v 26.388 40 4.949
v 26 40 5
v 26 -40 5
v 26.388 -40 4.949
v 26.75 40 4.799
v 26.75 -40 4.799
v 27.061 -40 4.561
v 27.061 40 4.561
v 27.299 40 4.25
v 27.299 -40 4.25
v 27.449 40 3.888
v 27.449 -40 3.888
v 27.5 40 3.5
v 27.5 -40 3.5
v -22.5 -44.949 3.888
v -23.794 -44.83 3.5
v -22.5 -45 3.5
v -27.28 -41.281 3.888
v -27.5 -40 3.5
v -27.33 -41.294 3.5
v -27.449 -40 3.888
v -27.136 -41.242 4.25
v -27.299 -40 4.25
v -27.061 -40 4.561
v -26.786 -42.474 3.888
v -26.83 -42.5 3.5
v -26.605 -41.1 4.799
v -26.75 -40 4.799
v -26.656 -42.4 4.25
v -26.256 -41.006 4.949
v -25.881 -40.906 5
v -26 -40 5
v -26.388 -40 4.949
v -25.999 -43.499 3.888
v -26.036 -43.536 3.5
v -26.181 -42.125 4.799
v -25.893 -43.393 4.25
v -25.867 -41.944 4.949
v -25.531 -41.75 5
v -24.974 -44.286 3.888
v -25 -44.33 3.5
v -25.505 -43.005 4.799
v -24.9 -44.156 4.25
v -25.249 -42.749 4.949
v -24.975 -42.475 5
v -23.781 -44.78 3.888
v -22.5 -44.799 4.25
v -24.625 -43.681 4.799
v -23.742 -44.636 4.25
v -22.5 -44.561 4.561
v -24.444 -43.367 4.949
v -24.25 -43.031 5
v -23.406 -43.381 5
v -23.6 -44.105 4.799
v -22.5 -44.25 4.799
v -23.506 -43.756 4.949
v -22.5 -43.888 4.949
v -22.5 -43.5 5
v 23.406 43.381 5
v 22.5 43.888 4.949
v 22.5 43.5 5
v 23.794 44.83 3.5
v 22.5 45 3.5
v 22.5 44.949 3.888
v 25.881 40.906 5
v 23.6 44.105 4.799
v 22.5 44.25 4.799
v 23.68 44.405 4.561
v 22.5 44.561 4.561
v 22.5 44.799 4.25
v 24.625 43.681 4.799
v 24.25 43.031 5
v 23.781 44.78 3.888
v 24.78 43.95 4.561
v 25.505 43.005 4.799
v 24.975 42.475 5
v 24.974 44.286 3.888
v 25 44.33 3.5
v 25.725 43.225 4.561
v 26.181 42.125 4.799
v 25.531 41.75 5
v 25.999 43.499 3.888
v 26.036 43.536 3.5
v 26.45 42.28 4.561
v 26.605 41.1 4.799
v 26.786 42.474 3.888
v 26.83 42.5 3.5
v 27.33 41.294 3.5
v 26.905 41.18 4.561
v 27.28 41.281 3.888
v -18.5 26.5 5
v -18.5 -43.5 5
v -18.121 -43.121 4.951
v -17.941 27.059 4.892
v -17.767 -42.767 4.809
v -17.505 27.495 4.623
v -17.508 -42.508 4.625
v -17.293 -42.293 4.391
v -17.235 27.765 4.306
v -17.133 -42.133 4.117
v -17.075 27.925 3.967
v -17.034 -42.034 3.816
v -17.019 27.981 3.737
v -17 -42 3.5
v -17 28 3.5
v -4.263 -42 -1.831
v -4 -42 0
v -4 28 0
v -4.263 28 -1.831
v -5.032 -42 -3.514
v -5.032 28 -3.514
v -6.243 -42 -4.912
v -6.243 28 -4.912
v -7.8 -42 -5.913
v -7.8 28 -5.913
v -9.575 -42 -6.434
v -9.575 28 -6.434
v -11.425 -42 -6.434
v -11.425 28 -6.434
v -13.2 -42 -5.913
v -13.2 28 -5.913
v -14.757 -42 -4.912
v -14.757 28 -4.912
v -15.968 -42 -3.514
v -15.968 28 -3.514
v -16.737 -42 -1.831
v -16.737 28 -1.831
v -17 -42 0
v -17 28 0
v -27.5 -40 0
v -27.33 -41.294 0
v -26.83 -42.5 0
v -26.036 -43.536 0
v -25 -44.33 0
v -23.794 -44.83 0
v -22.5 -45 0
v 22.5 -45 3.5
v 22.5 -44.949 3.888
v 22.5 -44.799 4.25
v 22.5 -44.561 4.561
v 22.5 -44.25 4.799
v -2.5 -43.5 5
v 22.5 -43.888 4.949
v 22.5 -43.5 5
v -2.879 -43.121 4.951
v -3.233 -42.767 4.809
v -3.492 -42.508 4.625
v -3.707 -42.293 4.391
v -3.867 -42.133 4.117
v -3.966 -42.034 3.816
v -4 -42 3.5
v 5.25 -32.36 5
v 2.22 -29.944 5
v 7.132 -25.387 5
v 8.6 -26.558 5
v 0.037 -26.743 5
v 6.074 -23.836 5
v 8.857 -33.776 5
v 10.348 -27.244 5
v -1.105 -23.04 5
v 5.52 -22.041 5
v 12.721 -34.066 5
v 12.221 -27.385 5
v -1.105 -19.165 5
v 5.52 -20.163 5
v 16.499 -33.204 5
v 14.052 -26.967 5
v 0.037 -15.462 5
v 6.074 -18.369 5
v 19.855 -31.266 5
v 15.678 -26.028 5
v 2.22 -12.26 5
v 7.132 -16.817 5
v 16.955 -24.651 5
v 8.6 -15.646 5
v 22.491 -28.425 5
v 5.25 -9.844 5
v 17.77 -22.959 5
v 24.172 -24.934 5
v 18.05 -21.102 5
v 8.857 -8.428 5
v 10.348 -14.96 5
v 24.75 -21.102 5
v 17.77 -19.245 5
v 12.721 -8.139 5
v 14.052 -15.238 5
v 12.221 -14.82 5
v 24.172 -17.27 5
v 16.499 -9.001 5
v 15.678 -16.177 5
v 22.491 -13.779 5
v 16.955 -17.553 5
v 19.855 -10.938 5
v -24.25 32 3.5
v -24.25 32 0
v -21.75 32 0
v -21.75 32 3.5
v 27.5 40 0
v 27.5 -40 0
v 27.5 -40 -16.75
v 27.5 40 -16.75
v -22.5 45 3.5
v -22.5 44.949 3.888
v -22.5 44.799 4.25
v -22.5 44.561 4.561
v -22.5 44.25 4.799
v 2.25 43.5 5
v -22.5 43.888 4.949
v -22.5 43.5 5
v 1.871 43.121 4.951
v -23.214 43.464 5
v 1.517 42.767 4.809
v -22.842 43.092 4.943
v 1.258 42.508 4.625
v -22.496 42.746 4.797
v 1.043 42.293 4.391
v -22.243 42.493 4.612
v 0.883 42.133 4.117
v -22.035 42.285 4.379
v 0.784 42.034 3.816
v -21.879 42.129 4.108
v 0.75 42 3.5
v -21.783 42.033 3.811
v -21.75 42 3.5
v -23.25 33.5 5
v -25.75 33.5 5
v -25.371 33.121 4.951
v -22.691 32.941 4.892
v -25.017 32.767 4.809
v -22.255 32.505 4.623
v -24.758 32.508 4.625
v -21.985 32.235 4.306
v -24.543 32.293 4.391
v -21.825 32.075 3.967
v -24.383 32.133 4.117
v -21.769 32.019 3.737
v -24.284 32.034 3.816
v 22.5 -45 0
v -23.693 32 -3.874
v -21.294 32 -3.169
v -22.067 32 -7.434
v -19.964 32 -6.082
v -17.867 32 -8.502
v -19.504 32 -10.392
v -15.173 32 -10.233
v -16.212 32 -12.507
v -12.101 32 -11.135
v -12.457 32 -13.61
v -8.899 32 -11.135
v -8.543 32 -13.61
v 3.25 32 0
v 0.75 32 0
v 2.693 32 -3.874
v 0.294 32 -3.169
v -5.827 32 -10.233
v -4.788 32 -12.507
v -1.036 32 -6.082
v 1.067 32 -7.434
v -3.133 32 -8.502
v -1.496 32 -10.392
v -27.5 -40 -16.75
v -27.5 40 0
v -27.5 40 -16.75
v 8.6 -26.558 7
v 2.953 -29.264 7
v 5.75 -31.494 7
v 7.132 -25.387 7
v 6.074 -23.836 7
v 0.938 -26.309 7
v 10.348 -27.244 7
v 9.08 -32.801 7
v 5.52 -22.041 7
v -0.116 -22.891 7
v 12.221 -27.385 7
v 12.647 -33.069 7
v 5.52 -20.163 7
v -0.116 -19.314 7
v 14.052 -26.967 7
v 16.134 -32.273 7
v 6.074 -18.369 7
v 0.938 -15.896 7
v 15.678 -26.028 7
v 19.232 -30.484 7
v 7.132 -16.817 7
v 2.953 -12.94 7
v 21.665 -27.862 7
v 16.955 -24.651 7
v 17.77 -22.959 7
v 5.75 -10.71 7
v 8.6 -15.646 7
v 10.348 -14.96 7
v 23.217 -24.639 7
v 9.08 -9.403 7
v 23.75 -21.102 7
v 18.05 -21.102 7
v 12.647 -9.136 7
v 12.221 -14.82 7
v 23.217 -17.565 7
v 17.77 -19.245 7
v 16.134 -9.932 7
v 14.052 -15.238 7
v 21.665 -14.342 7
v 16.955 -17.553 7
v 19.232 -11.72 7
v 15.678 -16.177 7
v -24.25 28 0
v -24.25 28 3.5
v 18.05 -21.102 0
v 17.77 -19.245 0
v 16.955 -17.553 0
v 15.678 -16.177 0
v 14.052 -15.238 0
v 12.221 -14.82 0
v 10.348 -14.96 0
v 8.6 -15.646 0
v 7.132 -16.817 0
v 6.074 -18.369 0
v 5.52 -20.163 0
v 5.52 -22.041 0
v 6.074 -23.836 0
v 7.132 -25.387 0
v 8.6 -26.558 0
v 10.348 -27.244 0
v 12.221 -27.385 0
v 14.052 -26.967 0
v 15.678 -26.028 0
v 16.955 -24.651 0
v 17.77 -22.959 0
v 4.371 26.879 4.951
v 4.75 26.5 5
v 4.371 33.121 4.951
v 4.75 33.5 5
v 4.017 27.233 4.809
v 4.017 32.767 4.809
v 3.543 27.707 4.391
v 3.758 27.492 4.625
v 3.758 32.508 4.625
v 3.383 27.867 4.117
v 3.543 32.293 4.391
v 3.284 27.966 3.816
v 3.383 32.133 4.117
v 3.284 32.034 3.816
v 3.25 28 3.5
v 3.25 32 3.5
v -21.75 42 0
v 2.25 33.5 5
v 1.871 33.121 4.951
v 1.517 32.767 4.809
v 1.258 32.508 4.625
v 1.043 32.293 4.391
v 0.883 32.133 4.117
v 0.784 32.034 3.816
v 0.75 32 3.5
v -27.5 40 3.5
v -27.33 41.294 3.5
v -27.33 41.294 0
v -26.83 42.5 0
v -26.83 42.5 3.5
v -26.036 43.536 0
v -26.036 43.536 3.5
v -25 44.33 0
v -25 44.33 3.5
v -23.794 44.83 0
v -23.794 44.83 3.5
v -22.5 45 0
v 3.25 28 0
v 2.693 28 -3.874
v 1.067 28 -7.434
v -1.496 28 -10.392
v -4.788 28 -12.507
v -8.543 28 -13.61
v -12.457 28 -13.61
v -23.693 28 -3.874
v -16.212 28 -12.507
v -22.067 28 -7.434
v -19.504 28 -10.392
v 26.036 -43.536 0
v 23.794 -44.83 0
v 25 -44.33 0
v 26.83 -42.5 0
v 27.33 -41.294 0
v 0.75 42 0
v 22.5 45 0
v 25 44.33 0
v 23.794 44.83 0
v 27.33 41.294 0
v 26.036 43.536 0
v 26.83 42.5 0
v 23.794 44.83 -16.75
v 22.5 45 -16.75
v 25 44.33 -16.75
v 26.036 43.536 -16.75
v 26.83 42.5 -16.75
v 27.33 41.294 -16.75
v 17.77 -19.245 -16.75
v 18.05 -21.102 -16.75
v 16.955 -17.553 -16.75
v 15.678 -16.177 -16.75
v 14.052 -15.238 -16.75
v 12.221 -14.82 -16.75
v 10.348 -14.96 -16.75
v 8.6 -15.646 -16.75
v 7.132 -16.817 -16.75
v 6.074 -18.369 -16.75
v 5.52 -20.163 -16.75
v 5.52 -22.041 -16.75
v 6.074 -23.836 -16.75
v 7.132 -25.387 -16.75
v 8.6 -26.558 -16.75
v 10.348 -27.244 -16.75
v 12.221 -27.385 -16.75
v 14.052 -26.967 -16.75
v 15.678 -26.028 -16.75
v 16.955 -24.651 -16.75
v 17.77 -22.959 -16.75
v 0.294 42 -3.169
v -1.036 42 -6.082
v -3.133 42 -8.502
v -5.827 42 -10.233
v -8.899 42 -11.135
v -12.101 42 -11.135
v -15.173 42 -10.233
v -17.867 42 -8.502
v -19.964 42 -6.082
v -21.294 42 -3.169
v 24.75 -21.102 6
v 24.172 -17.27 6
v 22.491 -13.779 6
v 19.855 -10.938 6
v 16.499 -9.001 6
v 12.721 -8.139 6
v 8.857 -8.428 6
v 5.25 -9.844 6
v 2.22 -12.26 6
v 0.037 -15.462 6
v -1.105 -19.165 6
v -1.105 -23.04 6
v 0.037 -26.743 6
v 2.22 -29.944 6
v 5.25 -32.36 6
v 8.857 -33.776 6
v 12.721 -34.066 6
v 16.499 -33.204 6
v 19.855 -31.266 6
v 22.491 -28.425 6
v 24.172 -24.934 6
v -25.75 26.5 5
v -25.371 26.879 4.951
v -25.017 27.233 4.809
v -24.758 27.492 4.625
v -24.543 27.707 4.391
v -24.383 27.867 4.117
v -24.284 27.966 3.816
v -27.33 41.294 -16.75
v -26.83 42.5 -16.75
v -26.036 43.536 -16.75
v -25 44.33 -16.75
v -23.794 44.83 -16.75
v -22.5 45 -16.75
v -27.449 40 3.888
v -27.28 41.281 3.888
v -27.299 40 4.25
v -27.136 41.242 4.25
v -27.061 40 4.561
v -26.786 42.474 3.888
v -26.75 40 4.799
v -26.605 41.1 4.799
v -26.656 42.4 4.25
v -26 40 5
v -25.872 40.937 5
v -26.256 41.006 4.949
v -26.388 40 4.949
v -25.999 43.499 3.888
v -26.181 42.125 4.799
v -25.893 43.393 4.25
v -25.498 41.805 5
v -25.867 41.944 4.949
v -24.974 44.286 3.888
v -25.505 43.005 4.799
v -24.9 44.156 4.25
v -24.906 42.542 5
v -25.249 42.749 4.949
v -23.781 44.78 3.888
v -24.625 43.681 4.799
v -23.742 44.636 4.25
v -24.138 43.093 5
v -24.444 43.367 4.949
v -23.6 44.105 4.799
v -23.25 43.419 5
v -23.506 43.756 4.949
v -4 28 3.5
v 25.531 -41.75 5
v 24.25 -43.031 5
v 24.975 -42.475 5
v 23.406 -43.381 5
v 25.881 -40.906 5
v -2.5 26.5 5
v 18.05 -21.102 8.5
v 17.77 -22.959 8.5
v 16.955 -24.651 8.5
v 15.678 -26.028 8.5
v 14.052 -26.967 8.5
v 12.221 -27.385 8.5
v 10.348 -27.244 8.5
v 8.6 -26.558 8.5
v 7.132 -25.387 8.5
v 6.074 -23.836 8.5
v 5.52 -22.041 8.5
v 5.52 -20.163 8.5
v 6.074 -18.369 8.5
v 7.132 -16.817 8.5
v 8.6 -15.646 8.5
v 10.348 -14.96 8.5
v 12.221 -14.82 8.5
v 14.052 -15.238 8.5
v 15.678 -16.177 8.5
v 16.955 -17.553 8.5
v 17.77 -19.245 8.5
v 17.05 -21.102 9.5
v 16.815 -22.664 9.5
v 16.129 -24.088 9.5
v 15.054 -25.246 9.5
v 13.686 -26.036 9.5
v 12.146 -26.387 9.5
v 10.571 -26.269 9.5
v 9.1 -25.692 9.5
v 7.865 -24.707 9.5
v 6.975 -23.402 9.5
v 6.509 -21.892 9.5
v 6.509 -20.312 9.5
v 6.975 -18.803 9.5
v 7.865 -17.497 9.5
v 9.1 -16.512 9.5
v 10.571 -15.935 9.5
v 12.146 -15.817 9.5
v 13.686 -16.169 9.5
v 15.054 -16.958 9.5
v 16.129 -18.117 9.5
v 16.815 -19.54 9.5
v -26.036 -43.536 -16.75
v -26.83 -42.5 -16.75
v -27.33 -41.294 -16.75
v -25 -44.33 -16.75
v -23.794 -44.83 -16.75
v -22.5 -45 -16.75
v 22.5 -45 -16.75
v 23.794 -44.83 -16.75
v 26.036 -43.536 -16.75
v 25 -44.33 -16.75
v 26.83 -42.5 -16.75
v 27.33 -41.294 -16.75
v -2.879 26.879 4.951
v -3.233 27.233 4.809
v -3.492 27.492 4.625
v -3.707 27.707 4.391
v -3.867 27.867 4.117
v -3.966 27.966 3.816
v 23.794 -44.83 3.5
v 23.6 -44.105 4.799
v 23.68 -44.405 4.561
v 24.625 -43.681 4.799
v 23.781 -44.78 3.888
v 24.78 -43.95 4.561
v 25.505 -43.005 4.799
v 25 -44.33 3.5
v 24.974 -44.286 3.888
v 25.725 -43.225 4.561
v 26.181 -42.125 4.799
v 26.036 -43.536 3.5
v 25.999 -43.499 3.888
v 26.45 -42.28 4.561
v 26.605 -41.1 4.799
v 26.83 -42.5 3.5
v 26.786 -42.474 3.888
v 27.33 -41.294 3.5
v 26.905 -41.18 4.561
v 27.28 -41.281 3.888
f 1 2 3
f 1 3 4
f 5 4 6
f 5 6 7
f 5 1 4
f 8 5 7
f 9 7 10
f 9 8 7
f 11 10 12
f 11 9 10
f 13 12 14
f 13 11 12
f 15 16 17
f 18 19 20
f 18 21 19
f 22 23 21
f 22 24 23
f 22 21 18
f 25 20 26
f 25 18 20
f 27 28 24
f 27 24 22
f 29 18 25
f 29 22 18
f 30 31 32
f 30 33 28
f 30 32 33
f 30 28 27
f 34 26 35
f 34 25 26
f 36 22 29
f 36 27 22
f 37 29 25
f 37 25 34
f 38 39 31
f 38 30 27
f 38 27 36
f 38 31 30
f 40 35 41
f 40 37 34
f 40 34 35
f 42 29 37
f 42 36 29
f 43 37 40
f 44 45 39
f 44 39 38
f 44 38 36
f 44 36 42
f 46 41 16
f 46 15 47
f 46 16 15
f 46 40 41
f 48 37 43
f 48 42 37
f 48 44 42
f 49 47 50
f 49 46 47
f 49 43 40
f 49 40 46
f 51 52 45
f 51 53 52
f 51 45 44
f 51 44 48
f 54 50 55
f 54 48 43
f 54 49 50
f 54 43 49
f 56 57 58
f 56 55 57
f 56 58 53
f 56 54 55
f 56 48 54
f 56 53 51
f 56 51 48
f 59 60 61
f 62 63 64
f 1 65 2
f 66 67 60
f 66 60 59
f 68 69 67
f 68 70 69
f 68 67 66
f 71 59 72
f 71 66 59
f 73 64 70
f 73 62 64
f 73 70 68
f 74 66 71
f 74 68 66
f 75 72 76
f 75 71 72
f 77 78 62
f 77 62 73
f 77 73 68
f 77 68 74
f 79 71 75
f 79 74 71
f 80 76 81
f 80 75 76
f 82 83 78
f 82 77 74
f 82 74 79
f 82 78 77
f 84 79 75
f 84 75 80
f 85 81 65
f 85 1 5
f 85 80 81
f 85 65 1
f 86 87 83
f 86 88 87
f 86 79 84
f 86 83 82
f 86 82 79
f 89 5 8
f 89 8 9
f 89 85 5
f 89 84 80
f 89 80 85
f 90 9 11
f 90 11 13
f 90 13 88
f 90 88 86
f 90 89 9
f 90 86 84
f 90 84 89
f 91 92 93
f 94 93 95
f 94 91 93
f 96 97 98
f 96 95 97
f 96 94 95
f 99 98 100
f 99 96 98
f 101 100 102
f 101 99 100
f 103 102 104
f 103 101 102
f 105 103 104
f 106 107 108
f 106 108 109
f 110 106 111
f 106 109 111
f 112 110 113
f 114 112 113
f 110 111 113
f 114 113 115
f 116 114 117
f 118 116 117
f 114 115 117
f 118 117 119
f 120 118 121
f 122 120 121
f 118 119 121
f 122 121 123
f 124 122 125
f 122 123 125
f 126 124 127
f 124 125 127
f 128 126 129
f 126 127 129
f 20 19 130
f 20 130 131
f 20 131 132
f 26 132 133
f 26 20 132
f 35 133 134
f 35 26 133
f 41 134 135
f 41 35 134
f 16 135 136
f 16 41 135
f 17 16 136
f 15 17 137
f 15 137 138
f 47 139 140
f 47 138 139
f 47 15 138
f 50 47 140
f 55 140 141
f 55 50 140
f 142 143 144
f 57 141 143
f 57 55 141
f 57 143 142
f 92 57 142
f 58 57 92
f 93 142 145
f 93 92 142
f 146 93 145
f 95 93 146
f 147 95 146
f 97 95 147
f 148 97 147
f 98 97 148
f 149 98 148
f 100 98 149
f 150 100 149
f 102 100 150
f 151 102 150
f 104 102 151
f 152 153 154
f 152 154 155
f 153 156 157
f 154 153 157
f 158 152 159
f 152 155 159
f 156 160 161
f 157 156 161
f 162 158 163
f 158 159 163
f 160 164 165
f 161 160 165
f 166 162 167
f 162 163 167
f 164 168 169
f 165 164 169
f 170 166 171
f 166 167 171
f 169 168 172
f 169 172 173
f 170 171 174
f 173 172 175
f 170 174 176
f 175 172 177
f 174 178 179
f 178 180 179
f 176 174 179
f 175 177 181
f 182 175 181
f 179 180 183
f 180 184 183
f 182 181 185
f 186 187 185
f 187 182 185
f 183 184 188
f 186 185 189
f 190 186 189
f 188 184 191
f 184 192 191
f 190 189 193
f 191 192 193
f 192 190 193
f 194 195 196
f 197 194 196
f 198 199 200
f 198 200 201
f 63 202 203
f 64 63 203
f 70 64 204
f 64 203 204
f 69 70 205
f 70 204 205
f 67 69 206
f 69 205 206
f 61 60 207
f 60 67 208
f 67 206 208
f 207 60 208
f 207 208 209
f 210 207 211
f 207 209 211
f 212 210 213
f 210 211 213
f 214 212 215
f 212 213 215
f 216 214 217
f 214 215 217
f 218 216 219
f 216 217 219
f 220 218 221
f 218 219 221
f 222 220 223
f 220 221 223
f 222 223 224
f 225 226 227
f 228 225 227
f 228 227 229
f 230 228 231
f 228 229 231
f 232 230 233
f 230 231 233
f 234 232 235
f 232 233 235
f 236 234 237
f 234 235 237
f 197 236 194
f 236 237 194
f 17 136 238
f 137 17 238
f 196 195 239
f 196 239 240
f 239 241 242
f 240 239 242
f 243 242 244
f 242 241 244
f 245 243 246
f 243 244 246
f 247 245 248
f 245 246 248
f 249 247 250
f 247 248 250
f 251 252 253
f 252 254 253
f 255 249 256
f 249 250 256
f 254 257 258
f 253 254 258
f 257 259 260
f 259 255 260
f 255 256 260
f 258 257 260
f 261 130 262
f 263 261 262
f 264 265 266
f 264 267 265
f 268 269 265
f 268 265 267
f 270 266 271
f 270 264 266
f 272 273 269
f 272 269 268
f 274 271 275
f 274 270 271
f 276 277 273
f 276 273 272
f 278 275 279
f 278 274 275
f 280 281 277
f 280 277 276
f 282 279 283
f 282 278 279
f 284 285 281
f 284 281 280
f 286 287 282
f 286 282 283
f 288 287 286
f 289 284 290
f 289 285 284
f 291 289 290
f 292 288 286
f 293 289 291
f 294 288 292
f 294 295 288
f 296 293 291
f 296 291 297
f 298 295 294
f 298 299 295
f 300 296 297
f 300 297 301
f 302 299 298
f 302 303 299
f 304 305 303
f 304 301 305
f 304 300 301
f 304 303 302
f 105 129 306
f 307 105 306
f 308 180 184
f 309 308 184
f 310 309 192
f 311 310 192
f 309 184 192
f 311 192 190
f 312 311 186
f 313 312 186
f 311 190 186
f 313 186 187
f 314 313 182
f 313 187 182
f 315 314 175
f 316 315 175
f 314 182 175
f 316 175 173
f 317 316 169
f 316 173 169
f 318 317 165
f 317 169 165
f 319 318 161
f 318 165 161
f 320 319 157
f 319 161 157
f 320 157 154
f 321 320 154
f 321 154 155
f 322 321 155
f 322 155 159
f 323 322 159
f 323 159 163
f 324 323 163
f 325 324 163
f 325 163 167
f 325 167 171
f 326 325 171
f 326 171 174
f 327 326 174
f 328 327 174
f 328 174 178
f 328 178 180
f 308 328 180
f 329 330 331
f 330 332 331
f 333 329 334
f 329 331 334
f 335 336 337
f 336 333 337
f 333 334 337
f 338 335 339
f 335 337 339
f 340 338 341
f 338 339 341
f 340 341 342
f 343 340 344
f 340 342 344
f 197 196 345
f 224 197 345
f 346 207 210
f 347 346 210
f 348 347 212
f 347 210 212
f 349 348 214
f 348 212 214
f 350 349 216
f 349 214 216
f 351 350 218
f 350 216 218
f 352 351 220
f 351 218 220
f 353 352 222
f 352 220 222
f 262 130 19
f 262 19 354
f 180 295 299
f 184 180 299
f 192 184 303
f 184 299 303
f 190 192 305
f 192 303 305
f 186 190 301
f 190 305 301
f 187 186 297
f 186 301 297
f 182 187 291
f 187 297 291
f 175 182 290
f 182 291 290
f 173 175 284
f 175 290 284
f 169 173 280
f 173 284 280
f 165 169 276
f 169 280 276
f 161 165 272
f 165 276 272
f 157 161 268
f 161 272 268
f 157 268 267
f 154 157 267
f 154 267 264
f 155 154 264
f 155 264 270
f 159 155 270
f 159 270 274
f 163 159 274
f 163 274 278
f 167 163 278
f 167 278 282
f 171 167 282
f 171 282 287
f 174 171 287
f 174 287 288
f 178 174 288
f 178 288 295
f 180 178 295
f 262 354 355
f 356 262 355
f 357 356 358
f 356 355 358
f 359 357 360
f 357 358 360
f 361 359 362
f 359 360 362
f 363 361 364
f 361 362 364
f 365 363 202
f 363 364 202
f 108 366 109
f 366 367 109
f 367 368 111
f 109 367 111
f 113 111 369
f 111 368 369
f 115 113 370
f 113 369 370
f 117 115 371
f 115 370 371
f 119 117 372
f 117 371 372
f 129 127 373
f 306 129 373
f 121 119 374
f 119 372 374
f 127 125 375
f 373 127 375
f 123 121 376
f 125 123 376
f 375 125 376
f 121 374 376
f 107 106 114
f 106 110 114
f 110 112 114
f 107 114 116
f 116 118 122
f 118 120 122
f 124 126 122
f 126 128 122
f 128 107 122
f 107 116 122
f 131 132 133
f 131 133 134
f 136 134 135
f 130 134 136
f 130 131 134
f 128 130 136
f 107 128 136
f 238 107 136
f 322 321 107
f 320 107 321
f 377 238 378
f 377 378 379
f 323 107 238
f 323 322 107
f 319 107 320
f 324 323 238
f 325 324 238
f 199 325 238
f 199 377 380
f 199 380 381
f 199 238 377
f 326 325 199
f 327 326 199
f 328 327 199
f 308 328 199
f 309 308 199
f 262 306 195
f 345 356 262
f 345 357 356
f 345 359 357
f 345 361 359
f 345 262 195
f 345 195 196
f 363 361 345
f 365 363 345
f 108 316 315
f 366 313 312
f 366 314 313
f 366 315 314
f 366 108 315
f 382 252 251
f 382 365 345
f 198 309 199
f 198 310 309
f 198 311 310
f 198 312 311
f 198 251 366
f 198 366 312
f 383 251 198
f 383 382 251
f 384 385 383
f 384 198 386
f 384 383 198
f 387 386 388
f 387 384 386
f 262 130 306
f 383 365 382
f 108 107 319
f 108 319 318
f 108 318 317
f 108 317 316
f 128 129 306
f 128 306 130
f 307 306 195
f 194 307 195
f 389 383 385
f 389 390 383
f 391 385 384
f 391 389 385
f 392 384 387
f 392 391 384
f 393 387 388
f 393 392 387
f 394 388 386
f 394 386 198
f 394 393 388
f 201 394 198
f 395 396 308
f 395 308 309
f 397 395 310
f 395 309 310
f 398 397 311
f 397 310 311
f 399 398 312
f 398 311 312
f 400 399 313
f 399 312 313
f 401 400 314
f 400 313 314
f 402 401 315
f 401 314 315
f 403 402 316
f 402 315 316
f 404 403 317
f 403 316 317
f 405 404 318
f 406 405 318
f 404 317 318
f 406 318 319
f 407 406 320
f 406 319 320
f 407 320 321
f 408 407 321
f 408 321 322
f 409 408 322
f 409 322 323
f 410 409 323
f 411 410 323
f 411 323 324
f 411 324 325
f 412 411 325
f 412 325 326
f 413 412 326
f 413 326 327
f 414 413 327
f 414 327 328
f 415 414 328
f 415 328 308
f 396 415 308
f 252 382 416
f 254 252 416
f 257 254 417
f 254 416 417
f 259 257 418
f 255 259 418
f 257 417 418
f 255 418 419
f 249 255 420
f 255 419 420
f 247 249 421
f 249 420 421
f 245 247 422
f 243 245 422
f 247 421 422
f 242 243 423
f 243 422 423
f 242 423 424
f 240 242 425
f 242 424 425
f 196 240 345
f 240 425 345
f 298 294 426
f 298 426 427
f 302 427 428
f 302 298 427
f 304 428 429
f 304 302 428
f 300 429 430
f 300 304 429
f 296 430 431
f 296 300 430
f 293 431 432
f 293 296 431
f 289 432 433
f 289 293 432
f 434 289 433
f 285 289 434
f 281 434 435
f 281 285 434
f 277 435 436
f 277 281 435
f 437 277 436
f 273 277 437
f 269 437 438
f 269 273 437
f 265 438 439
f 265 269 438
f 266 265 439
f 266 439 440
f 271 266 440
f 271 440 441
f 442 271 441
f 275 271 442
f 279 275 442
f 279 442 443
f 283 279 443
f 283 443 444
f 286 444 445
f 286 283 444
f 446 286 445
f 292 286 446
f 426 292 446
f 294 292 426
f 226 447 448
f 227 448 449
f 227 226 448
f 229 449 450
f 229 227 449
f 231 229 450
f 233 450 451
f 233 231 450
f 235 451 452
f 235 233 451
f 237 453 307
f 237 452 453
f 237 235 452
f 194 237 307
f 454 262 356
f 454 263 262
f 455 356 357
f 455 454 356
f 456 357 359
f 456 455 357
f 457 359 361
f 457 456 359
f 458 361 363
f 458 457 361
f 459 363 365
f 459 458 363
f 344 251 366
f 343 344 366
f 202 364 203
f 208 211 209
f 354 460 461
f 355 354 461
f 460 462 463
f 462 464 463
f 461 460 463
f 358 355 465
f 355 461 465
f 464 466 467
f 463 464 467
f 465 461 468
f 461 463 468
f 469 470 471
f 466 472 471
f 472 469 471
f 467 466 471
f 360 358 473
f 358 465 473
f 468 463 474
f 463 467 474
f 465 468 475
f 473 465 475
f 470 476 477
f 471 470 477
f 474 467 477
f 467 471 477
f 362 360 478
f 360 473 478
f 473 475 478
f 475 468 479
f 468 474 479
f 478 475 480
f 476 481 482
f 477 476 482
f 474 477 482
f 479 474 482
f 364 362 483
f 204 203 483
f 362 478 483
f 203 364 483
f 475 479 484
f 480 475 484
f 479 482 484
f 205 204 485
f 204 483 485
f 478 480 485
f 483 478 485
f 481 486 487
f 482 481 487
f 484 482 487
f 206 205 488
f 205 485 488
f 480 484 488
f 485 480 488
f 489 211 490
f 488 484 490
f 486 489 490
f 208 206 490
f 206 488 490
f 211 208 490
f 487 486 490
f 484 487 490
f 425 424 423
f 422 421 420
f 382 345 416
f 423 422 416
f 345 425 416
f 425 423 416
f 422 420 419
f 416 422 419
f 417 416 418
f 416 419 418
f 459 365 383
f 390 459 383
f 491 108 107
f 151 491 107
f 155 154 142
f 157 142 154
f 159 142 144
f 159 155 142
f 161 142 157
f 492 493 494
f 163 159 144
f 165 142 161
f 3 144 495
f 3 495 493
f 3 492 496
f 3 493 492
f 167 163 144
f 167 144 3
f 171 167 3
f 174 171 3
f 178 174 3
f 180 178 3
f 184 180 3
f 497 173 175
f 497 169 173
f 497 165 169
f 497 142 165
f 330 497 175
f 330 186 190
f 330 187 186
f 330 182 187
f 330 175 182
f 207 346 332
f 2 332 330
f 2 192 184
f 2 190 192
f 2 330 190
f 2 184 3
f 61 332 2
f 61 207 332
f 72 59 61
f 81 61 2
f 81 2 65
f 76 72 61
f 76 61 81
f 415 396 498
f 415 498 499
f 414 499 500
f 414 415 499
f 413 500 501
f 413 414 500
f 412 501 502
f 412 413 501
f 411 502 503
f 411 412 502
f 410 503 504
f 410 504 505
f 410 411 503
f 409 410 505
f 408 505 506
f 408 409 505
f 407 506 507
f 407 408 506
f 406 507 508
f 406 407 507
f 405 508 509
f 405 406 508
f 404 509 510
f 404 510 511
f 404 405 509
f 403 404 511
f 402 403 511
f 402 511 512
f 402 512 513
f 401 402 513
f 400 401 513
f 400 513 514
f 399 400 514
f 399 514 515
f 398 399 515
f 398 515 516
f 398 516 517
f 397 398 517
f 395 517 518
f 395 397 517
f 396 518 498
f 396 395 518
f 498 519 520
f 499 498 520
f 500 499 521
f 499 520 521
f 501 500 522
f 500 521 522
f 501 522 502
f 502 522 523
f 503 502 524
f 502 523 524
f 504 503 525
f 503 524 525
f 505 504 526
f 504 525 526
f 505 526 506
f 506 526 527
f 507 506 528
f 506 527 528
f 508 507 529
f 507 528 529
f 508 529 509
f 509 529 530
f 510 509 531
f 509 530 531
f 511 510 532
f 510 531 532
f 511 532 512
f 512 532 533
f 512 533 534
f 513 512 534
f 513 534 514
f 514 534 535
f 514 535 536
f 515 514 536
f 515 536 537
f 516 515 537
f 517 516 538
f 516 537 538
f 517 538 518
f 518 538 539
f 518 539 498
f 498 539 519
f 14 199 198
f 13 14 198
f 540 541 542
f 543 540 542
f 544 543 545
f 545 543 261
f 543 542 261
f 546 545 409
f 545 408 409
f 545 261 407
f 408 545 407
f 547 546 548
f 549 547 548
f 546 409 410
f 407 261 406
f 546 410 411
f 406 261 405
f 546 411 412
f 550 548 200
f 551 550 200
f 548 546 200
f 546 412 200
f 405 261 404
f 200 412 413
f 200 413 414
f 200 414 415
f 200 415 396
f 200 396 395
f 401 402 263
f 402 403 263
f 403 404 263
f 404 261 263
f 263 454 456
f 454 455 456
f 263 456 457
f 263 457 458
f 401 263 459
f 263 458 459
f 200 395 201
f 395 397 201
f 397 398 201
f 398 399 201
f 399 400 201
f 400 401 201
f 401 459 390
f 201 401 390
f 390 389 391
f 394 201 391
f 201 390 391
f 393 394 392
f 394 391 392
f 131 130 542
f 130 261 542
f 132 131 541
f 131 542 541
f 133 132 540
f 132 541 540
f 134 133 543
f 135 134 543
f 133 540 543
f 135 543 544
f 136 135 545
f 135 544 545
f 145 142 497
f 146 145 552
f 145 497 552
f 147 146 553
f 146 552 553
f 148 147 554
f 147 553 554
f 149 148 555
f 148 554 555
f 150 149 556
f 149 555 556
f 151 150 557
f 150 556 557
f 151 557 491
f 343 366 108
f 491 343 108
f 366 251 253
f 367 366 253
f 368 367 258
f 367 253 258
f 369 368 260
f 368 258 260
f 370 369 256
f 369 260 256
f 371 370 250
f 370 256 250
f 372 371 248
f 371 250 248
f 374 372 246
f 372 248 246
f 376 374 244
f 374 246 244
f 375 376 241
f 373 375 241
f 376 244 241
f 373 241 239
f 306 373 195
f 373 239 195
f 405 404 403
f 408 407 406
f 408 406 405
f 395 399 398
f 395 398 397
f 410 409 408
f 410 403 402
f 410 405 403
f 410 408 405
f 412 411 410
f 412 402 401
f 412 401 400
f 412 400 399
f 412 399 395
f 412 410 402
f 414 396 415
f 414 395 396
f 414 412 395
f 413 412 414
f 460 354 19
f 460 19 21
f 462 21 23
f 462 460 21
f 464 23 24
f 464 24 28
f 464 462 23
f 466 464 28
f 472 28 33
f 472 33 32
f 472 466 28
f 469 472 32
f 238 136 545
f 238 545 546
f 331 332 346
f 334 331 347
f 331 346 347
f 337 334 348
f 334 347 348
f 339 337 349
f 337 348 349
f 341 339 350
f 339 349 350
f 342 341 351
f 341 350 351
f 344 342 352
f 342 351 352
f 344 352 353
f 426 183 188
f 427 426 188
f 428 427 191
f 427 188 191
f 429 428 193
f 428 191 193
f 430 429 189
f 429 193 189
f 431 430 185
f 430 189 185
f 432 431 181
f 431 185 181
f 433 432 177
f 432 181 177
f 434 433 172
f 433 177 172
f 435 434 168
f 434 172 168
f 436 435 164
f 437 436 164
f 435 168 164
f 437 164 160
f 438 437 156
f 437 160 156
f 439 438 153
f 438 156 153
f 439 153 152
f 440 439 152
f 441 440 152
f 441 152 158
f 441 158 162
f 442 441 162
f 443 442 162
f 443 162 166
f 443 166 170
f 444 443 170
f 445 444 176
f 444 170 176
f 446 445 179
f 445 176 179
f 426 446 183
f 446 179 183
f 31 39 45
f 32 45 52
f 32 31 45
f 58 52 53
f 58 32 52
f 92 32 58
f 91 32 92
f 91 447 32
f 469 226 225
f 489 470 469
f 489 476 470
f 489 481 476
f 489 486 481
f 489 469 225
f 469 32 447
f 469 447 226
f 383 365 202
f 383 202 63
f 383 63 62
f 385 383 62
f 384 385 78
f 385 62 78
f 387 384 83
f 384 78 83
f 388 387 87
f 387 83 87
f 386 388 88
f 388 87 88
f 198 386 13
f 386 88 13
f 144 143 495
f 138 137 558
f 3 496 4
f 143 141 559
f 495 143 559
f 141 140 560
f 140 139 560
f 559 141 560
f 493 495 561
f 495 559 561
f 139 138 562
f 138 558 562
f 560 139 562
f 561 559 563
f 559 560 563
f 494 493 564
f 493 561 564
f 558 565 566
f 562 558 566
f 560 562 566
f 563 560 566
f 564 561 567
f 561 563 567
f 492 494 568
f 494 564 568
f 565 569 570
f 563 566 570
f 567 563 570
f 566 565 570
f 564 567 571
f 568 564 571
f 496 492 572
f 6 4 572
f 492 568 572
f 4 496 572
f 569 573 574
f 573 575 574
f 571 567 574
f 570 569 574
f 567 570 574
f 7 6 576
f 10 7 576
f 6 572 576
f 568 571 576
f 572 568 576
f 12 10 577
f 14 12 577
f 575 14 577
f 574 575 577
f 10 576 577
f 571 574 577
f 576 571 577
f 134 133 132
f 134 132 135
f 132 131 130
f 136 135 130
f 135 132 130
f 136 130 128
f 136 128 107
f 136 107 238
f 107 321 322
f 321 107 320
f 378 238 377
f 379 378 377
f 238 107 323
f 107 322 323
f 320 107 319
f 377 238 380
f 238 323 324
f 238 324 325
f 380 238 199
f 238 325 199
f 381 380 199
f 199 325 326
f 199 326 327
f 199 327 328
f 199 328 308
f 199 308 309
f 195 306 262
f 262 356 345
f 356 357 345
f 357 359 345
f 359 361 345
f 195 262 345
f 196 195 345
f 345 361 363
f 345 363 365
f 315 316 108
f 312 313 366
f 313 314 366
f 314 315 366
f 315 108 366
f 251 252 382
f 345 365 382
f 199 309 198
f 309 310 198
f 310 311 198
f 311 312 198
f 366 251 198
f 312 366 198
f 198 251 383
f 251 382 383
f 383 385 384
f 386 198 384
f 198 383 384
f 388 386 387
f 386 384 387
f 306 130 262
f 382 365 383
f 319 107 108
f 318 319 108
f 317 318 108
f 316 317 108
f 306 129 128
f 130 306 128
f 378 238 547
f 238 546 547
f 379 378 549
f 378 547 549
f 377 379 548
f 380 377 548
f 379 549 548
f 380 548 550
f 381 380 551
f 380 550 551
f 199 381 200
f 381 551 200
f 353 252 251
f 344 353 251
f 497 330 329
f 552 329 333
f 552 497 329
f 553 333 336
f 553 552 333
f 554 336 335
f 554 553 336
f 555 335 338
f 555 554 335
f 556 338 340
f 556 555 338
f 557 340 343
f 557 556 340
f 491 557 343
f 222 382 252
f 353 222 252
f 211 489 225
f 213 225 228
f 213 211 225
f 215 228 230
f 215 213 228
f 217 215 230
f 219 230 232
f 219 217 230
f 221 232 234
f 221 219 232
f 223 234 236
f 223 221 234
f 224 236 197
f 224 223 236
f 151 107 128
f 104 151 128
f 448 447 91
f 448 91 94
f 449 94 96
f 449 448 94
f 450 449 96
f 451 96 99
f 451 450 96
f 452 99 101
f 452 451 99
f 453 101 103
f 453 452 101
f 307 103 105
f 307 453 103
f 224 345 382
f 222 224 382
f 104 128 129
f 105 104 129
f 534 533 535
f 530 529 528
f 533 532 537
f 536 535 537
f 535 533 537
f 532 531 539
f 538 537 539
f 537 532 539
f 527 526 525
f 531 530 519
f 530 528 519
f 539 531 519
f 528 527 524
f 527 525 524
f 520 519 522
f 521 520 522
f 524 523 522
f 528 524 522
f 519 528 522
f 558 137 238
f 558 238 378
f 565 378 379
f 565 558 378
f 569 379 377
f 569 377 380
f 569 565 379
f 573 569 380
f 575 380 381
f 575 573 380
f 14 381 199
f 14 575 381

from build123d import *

# Parameters (mm, degrees)
F0_W           = 55
F0_H           = 90
F1_DEPTH       = 16.75
F4_R           = 13
F5_DEPTH       = 2
F7_W           = 55
F7_H           = 90
F8_DEPTH       = 5
F9_R           = 13
F10_DEPTH      = 2
F11_R          = 6.3
F12_DEPTH      = 23.751
F13_R          = 5
F13_2_R        = 5
F14_SIZE       = 1
F15_T1_DEPTH   = 22.5
F15_T3_DEPTH   = 13.75
F15_T5_DEPTH   = 6.25
F15_T7_DEPTH   = 4
F15_T9_DEPTH   = 11
F15_T11_DEPTH  = 73.75
F15_T13_DEPTH  = 13
F15_T15_DEPTH  = 11
F15_T17_DEPTH  = 6.25
F15_T19_DEPTH  = 80
F15_T21_DEPTH  = 45
F15_T24_ANGLE  = 90
F15_T26_ANGLE  = 90
F15_T28_ANGLE  = 90
F15_T30_ANGLE  = 90
F15_T35_DEPTH  = 26.25
F15_T39_DEPTH  = 17.5
F15_T46_DEPTH  = 26.25
F15_T50_DEPTH  = 17.5
F15_T57_DEPTH  = 10
F15_T61_DEPTH  = 7.75
F15_T68_DEPTH  = 7.75
F15_T72_DEPTH  = 14.75
F15_T79_DEPTH  = 77.5
F15_T83_DEPTH  = 16.75
F15_T90_DEPTH  = 77.5
F15_T94_DEPTH  = 16.75
F15_T101_DEPTH = 7.75
F15_T105_DEPTH = 14.75
F15_T112_DEPTH = 10
F15_T116_DEPTH = 7.75
F16_R          = 6.3
F17_DEPTH      = 26.25
F18_SIZE       = 1


# Not quite as in the source:
# - a fillet or chamfer that OpenCascade refuses, or shapes differently, is made with other operations: its cross-section is extruded or revolved along the edge and cut away or added


with BuildPart() as f1:
    # F0 (on Top) → F1 (new body)
    with BuildSketch(Plane.XY):
        Rectangle(F0_W, F0_H)
    extrude(amount=-F1_DEPTH)

    # F2 (on face) → F3 (revolve, cut)
    with BuildSketch(Plane.XY):
        Polygon((0.75, 42), (-10.5, 42), (-10.5, -42), (-4, -42), (-4, 28), (3.25, 28), (3.25, 32), (0.75, 32), align=None)
    revolve(axis=Axis((-10.5, 0, 0), (0, 1, 0)), mode=Mode.SUBTRACT)


with BuildPart() as f5:
    # F4 (on face) → F5 (new body)
    with BuildSketch(Plane.XY):
        with Locations((12.5, -25)):
            Circle(F4_R)
    extrude(amount=F5_DEPTH)


with BuildPart() as f8:
    # F7 (on face) → F8 (new body)
    with BuildSketch(Plane.XY):
        Rectangle(F7_W, F7_H)
        Polygon((-21.75, 42), (0.75, 42), (0.75, 32), (3.25, 32), (3.25, 28), (-4, 28), (-4, -42), (-17, -42), (-17, 28), (-24.25, 28), (-24.25, 32), (-21.75, 32), align=None, mode=Mode.SUBTRACT)
    extrude(amount=F8_DEPTH)


with BuildPart() as f10:
    # F9 (on face) → F10 (new body)
    with BuildSketch(Plane.XY.offset(5)):
        with Locations((11.75, -21.1021695286)):
            Circle(F9_R)
    extrude(amount=F10_DEPTH)


with BuildPart() as f12_tool:
    # F11 (on face) → F12 (new body, through all)
    with BuildSketch(Plane.XY.offset(7)):
        with Locations((11.75, -21.1021695286)):
            Circle(F11_R)
    extrude(amount=-F12_DEPTH)


with BuildPart() as f1_1:
    add(f1.part)

    # F12: cut by f12_tool
    add(f12_tool.part, mode=Mode.SUBTRACT)

    # F13
    f13_edges = [f1_1.edges().sort_by_distance(p)[0] for p in [
        (-27.5, -45, -8.375),
        (27.5, -45, -8.375),
        (27.5, 45, -8.375),
        (-27.5, 45, -8.375),
    ]]
    fillet(f13_edges, radius=F13_R)


with BuildPart() as f8_1:
    add(f8.part)

    # F12: cut by f12_tool
    add(f12_tool.part, mode=Mode.SUBTRACT)

    # F13#2
    f13_2_edges = [f8_1.edges().sort_by_distance(p)[0] for p in [
        (-27.5, -45, 2.5),
        (27.5, -45, 2.5),
        (27.5, 45, 2.5),
        (-27.5, 45, 2.5),
    ]]
    fillet(f13_2_edges, radius=F13_2_R)

    # F15: fillet of radius 1.5 on 13 edges, made by hand

    # F15_s2 → F15_t1 (cut)
    with BuildSketch(Plane.YZ.offset(-21.75)):
        with BuildLine():
            ThreePointArc((43.5, 5), (42.4393398282, 4.5606601718), (42, 3.5))
            Line((42, 3.5), (42, 5))
            Line((42, 5), (43.5, 5))
        make_face()
    extrude(amount=F15_T1_DEPTH, mode=Mode.SUBTRACT)

    # F15_s4 → F15_t3 (cut)
    with BuildSketch(Plane.XZ.offset(-42)):
        with BuildLine():
            ThreePointArc((-23.25, 5), (-22.1893398282, 4.5606601718), (-21.75, 3.5))
            Line((-21.75, 3.5), (-21.75, 5))
            Line((-21.75, 5), (-23.25, 5))
        make_face()
        with BuildLine():
            ThreePointArc((2.25, 5), (1.1893398282, 4.5606601718), (0.75, 3.5))
            Line((0.75, 3.5), (0.75, 5))
            Line((0.75, 5), (2.25, 5))
        make_face()
    extrude(amount=F15_T3_DEPTH, mode=Mode.SUBTRACT)

    # F15_s6 → F15_t5 (cut)
    with BuildSketch(Plane.YZ.offset(-24.25)):
        with BuildLine():
            ThreePointArc((33.5, 5), (32.4393398282, 4.5606601718), (32, 3.5))
            Line((32, 3.5), (32, 5))
            Line((32, 5), (33.5, 5))
        make_face()
    extrude(amount=F15_T5_DEPTH, mode=Mode.SUBTRACT)

    # F15_s8 → F15_t7 (cut)
    with BuildSketch(Plane.XZ.offset(-32)):
        with BuildLine():
            ThreePointArc((-25.75, 5), (-24.6893398282, 4.5606601718), (-24.25, 3.5))
            Line((-24.25, 3.5), (-24.25, 5))
            Line((-24.25, 5), (-25.75, 5))
        make_face()
        with BuildLine():
            ThreePointArc((4.75, 5), (3.6893398282, 4.5606601718), (3.25, 3.5))
            Line((3.25, 3.5), (3.25, 5))
            Line((3.25, 5), (4.75, 5))
        make_face()
    extrude(amount=F15_T7_DEPTH, mode=Mode.SUBTRACT)

    # F15_s10 → F15_t9 (cut)
    with BuildSketch(Plane.YZ.offset(-24.25)):
        with BuildLine():
            ThreePointArc((26.5, 5), (27.5606601718, 4.5606601718), (28, 3.5))
            Line((28, 3.5), (28, 5))
            Line((28, 5), (26.5, 5))
        make_face()
    extrude(amount=F15_T9_DEPTH, mode=Mode.SUBTRACT)

    # F15_s12 → F15_t11 (cut)
    with BuildSketch(Plane.XZ.offset(-31.75)):
        with BuildLine():
            ThreePointArc((-18.5, 5), (-17.4393398282, 4.5606601718), (-17, 3.5))
            Line((-17, 3.5), (-17, 5))
            Line((-17, 5), (-18.5, 5))
        make_face()
        with BuildLine():
            ThreePointArc((-2.5, 5), (-3.5606601718, 4.5606601718), (-4, 3.5))
            Line((-4, 3.5), (-4, 5))
            Line((-4, 5), (-2.5, 5))
        make_face()
    extrude(amount=F15_T11_DEPTH, mode=Mode.SUBTRACT)

    # F15_s14 → F15_t13 (cut)
    with BuildSketch(Plane.YZ.offset(-17)):
        with BuildLine():
            ThreePointArc((-43.5, 5), (-42.4393398282, 4.5606601718), (-42, 3.5))
            Line((-42, 3.5), (-42, 5))
            Line((-42, 5), (-43.5, 5))
        make_face()
    extrude(amount=F15_T13_DEPTH, mode=Mode.SUBTRACT)

    # F15_s16 → F15_t15 (cut)
    with BuildSketch(Plane.YZ.offset(-7.75)):
        with BuildLine():
            ThreePointArc((26.5, 5), (27.5606601718, 4.5606601718), (28, 3.5))
            Line((28, 3.5), (28, 5))
            Line((28, 5), (26.5, 5))
        make_face()
    extrude(amount=F15_T15_DEPTH, mode=Mode.SUBTRACT)

    # F15_s18 → F15_t17 (cut)
    with BuildSketch(Plane.YZ.offset(-3)):
        with BuildLine():
            ThreePointArc((33.5, 5), (32.4393398282, 4.5606601718), (32, 3.5))
            Line((32, 3.5), (32, 5))
            Line((32, 5), (33.5, 5))
        make_face()
    extrude(amount=F15_T17_DEPTH, mode=Mode.SUBTRACT)

    # F15_s20 → F15_t19 (cut)
    with BuildSketch(Plane.XZ.offset(-40)):
        with BuildLine():
            ThreePointArc((26, 5), (27.0606601718, 4.5606601718), (27.5, 3.5))
            Line((27.5, 3.5), (27.5, 5))
            Line((27.5, 5), (26, 5))
        make_face()
        with BuildLine():
            ThreePointArc((-27.5, 3.5), (-27.0606601718, 4.5606601718), (-26, 5))
            Line((-26, 5), (-27.5, 5))
            Line((-27.5, 5), (-27.5, 3.5))
        make_face()
    extrude(amount=F15_T19_DEPTH, mode=Mode.SUBTRACT)

    # F15_s22 → F15_t21 (cut)
    with BuildSketch(Plane.YZ.offset(-22.5)):
        with BuildLine():
            ThreePointArc((43.5, 5), (44.5606601718, 4.5606601718), (45, 3.5))
            Line((45, 3.5), (45, 5))
            Line((45, 5), (43.5, 5))
        make_face()
        with BuildLine():
            ThreePointArc((-43.5, 5), (-44.5606601718, 4.5606601718), (-45, 3.5))
            Line((-45, 3.5), (-45, 5))
            Line((-45, 5), (-43.5, 5))
        make_face()
    extrude(amount=F15_T21_DEPTH, mode=Mode.SUBTRACT)

    # F15_s23 → F15_t24 (revolve, cut)
    with BuildSketch(Plane.YZ.offset(22.5)):
        with BuildLine():
            ThreePointArc((-43.5, 5), (-44.5606601718, 4.5606601718), (-45, 3.5))
            Line((-45, 3.5), (-45, 5))
            Line((-45, 5), (-43.5, 5))
        make_face()
    revolve(axis=Axis((22.5, -40, 5), (0, 0, 1)), revolution_arc=F15_T24_ANGLE, mode=Mode.SUBTRACT)

    # F15_s25 → F15_t26 (revolve, cut)
    with BuildSketch(Plane.YZ.offset(22.5)):
        with BuildLine():
            ThreePointArc((43.5, 5), (44.5606601718, 4.5606601718), (45, 3.5))
            Line((45, 3.5), (45, 5))
            Line((45, 5), (43.5, 5))
        make_face()
    revolve(axis=Axis((22.5, 40, 5), (0, 0, -1)), revolution_arc=F15_T26_ANGLE, mode=Mode.SUBTRACT)

    # F15_s27 → F15_t28 (revolve, cut)
    with BuildSketch(Plane.XZ.offset(-40)):
        with BuildLine():
            ThreePointArc((-27.5, 3.5), (-27.0606601718, 4.5606601718), (-26, 5))
            Line((-26, 5), (-27.5, 5))
            Line((-27.5, 5), (-27.5, 3.5))
        make_face()
    revolve(axis=Axis((-22.5, 40, 5), (0, 0, -1)), revolution_arc=F15_T28_ANGLE, mode=Mode.SUBTRACT)

    # F15_s29 → F15_t30 (revolve, cut)
    with BuildSketch(Plane.XZ.offset(40)):
        with BuildLine():
            ThreePointArc((-27.5, 3.5), (-27.0606601718, 4.5606601718), (-26, 5))
            Line((-26, 5), (-27.5, 5))
            Line((-27.5, 5), (-27.5, 3.5))
        make_face()
    revolve(axis=Axis((-22.5, -40, 5), (0, 0, 1)), revolution_arc=F15_T30_ANGLE, mode=Mode.SUBTRACT)


with BuildPart() as f10_1:
    add(f10.part)

    # F12: cut by f12_tool
    add(f12_tool.part, mode=Mode.SUBTRACT)

    # F14
    f14_edges = [f10_1.edges().sort_by_distance(p)[0] for p in [
        (-1.25, -21.10217, 7),
    ]]
    chamfer(f14_edges, length=F14_SIZE)


with BuildPart() as f15_tool33:
    # F15_s34 → F15_t35 (new body)
    with BuildSketch(Plane.YZ.offset(-25.5)):
        with BuildLine():
            ThreePointArc((43.5, 5), (42.4393398282, 4.5606601718), (42, 3.5))
            Line((42, 3.5), (42, 5))
            Line((42, 5), (43.5, 5))
        make_face()
    extrude(amount=F15_T35_DEPTH)

    split(bisect_by=Plane.YZ.offset(-21.75), keep=Keep.BOTTOM)


with BuildPart() as f15_tool37:
    # F15_s38 → F15_t39 (new body)
    with BuildSketch(Plane.XZ.offset(-28.25)):
        with BuildLine():
            ThreePointArc((-23.25, 5), (-22.1893398282, 4.5606601718), (-21.75, 3.5))
            Line((-21.75, 3.5), (-21.75, 5))
            Line((-21.75, 5), (-23.25, 5))
        make_face()
    extrude(amount=-F15_T39_DEPTH)

    split(bisect_by=Plane.XZ.offset(-42), keep=Keep.BOTTOM)


with BuildPart() as f15_tool33_1:
    add(f15_tool33.part)

    # F15_t41: intersect F15_tool37
    add(f15_tool37.part, mode=Mode.INTERSECT)


with BuildPart() as f8_2:
    add(f8_1.part)

    # F15_t31: cut F15_tool33
    add(f15_tool33_1.part, mode=Mode.SUBTRACT)


with BuildPart() as f15_tool44:
    # F15_s45 → F15_t46 (new body)
    with BuildSketch(Plane.YZ.offset(-21.75)):
        with BuildLine():
            ThreePointArc((43.5, 5), (42.4393398282, 4.5606601718), (42, 3.5))
            Line((42, 3.5), (42, 5))
            Line((42, 5), (43.5, 5))
        make_face()
    extrude(amount=F15_T46_DEPTH)

    split(bisect_by=Plane.YZ.offset(0.75), keep=Keep.TOP)


with BuildPart() as f15_tool48:
    # F15_s49 → F15_t50 (new body)
    with BuildSketch(Plane.XZ.offset(-45.75)):
        with BuildLine():
            ThreePointArc((2.25, 5), (1.1893398282, 4.5606601718), (0.75, 3.5))
            Line((0.75, 3.5), (0.75, 5))
            Line((0.75, 5), (2.25, 5))
        make_face()
    extrude(amount=F15_T50_DEPTH)

    split(bisect_by=Plane.XZ.offset(-42), keep=Keep.BOTTOM)


with BuildPart() as f15_tool44_1:
    add(f15_tool44.part)

    # F15_t52: intersect F15_tool48
    add(f15_tool48.part, mode=Mode.INTERSECT)


with BuildPart() as f8_3:
    add(f8_2.part)

    # F15_t42: cut F15_tool44
    add(f15_tool44_1.part, mode=Mode.SUBTRACT)


with BuildPart() as f15_tool55:
    # F15_s56 → F15_t57 (new body)
    with BuildSketch(Plane.YZ.offset(-28)):
        with BuildLine():
            ThreePointArc((33.5, 5), (32.4393398282, 4.5606601718), (32, 3.5))
            Line((32, 3.5), (32, 5))
            Line((32, 5), (33.5, 5))
        make_face()
    extrude(amount=F15_T57_DEPTH)

    split(bisect_by=Plane.YZ.offset(-24.25), keep=Keep.BOTTOM)


with BuildPart() as f15_tool59:
    # F15_s60 → F15_t61 (new body)
    with BuildSketch(Plane.XZ.offset(-28)):
        with BuildLine():
            ThreePointArc((-25.75, 5), (-24.6893398282, 4.5606601718), (-24.25, 3.5))
            Line((-24.25, 3.5), (-24.25, 5))
            Line((-24.25, 5), (-25.75, 5))
        make_face()
    extrude(amount=-F15_T61_DEPTH)

    split(bisect_by=Plane.XZ.offset(-32), keep=Keep.BOTTOM)


with BuildPart() as f15_tool55_1:
    add(f15_tool55.part)

    # F15_t63: intersect F15_tool59
    add(f15_tool59.part, mode=Mode.INTERSECT)


with BuildPart() as f8_4:
    add(f8_3.part)

    # F15_t53: cut F15_tool55
    add(f15_tool55_1.part, mode=Mode.SUBTRACT)


with BuildPart() as f15_tool66:
    # F15_s67 → F15_t68 (new body)
    with BuildSketch(Plane.XZ.offset(-24.25)):
        with BuildLine():
            ThreePointArc((-25.75, 5), (-24.6893398282, 4.5606601718), (-24.25, 3.5))
            Line((-24.25, 3.5), (-24.25, 5))
            Line((-24.25, 5), (-25.75, 5))
        make_face()
    extrude(amount=-F15_T68_DEPTH)

    split(bisect_by=Plane.XZ.offset(-28), keep=Keep.TOP)


with BuildPart() as f15_tool70:
    # F15_s71 → F15_t72 (new body)
    with BuildSketch(Plane.YZ.offset(-13.25)):
        with BuildLine():
            ThreePointArc((26.5, 5), (27.5606601718, 4.5606601718), (28, 3.5))
            Line((28, 3.5), (28, 5))
            Line((28, 5), (26.5, 5))
        make_face()
    extrude(amount=-F15_T72_DEPTH)

    split(bisect_by=Plane.YZ.offset(-24.25), keep=Keep.BOTTOM)


with BuildPart() as f15_tool66_1:
    add(f15_tool66.part)

    # F15_t74: intersect F15_tool70
    add(f15_tool70.part, mode=Mode.INTERSECT)


with BuildPart() as f8_5:
    add(f8_4.part)

    # F15_t64: cut F15_tool66
    add(f15_tool66_1.part, mode=Mode.SUBTRACT)


with BuildPart() as f15_tool77:
    # F15_s78 → F15_t79 (new body)
    with BuildSketch(Plane.XZ.offset(45.75)):
        with BuildLine():
            ThreePointArc((-18.5, 5), (-17.4393398282, 4.5606601718), (-17, 3.5))
            Line((-17, 3.5), (-17, 5))
            Line((-17, 5), (-18.5, 5))
        make_face()
    extrude(amount=-F15_T79_DEPTH)

    split(bisect_by=Plane.XZ.offset(42), keep=Keep.TOP)


with BuildPart() as f15_tool81:
    # F15_s82 → F15_t83 (new body)
    with BuildSketch(Plane.YZ.offset(-4)):
        with BuildLine():
            ThreePointArc((-43.5, 5), (-42.4393398282, 4.5606601718), (-42, 3.5))
            Line((-42, 3.5), (-42, 5))
            Line((-42, 5), (-43.5, 5))
        make_face()
    extrude(amount=-F15_T83_DEPTH)

    split(bisect_by=Plane.YZ.offset(-17), keep=Keep.BOTTOM)


with BuildPart() as f15_tool77_1:
    add(f15_tool77.part)

    # F15_t85: intersect F15_tool81
    add(f15_tool81.part, mode=Mode.INTERSECT)


with BuildPart() as f8_6:
    add(f8_5.part)

    # F15_t75: cut F15_tool77
    add(f15_tool77_1.part, mode=Mode.SUBTRACT)


with BuildPart() as f15_tool88:
    # F15_s89 → F15_t90 (new body)
    with BuildSketch(Plane.XZ.offset(-31.75)):
        with BuildLine():
            ThreePointArc((-2.5, 5), (-3.5606601718, 4.5606601718), (-4, 3.5))
            Line((-4, 3.5), (-4, 5))
            Line((-4, 5), (-2.5, 5))
        make_face()
    extrude(amount=F15_T90_DEPTH)

    split(bisect_by=Plane.XZ.offset(42), keep=Keep.TOP)


with BuildPart() as f15_tool92:
    # F15_s93 → F15_t94 (new body)
    with BuildSketch(Plane.YZ.offset(-0.25)):
        with BuildLine():
            ThreePointArc((-43.5, 5), (-42.4393398282, 4.5606601718), (-42, 3.5))
            Line((-42, 3.5), (-42, 5))
            Line((-42, 5), (-43.5, 5))
        make_face()
    extrude(amount=-F15_T94_DEPTH)

    split(bisect_by=Plane.YZ.offset(-4), keep=Keep.TOP)


with BuildPart() as f15_tool88_1:
    add(f15_tool88.part)

    # F15_t96: intersect F15_tool92
    add(f15_tool92.part, mode=Mode.INTERSECT)


with BuildPart() as f8_7:
    add(f8_6.part)

    # F15_t86: cut F15_tool88
    add(f15_tool88_1.part, mode=Mode.SUBTRACT)


with BuildPart() as f15_tool99:
    # F15_s100 → F15_t101 (new body)
    with BuildSketch(Plane.XZ.offset(-32)):
        with BuildLine():
            ThreePointArc((4.75, 5), (3.6893398282, 4.5606601718), (3.25, 3.5))
            Line((3.25, 3.5), (3.25, 5))
            Line((3.25, 5), (4.75, 5))
        make_face()
    extrude(amount=F15_T101_DEPTH)

    split(bisect_by=Plane.XZ.offset(-28), keep=Keep.TOP)


with BuildPart() as f15_tool103:
    # F15_s104 → F15_t105 (new body)
    with BuildSketch(Plane.YZ.offset(7)):
        with BuildLine():
            ThreePointArc((26.5, 5), (27.5606601718, 4.5606601718), (28, 3.5))
            Line((28, 3.5), (28, 5))
            Line((28, 5), (26.5, 5))
        make_face()
    extrude(amount=-F15_T105_DEPTH)

    split(bisect_by=Plane.YZ.offset(3.25), keep=Keep.TOP)


with BuildPart() as f15_tool99_1:
    add(f15_tool99.part)

    # F15_t107: intersect F15_tool103
    add(f15_tool103.part, mode=Mode.INTERSECT)


with BuildPart() as f8_8:
    add(f8_7.part)

    # F15_t97: cut F15_tool99
    add(f15_tool99_1.part, mode=Mode.SUBTRACT)


with BuildPart() as f15_tool110:
    # F15_s111 → F15_t112 (new body)
    with BuildSketch(Plane.YZ.offset(-3)):
        with BuildLine():
            ThreePointArc((33.5, 5), (32.4393398282, 4.5606601718), (32, 3.5))
            Line((32, 3.5), (32, 5))
            Line((32, 5), (33.5, 5))
        make_face()
    extrude(amount=F15_T112_DEPTH)

    split(bisect_by=Plane.YZ.offset(3.25), keep=Keep.TOP)


with BuildPart() as f15_tool114:
    # F15_s115 → F15_t116 (new body)
    with BuildSketch(Plane.XZ.offset(-35.75)):
        with BuildLine():
            ThreePointArc((4.75, 5), (3.6893398282, 4.5606601718), (3.25, 3.5))
            Line((3.25, 3.5), (3.25, 5))
            Line((3.25, 5), (4.75, 5))
        make_face()
    extrude(amount=F15_T116_DEPTH)

    split(bisect_by=Plane.XZ.offset(-32), keep=Keep.BOTTOM)


with BuildPart() as f15_tool110_1:
    add(f15_tool110.part)

    # F15_t118: intersect F15_tool114
    add(f15_tool114.part, mode=Mode.INTERSECT)


with BuildPart() as f8_9:
    add(f8_8.part)

    # F15_t108: cut F15_tool110
    add(f15_tool110_1.part, mode=Mode.SUBTRACT)


with BuildPart() as f17:
    # F16 (on face) → F17 (new body)
    with BuildSketch(Plane(origin=(0, 0, -16.75), x_dir=(1, 0, 0), z_dir=(0, 0, -1))):
        with Locations((11.75, 21.1021695286)):
            Circle(F16_R)
    extrude(amount=-F17_DEPTH)

    # F18
    f18_edges = [f17.edges().sort_by_distance(p)[0] for p in [
        (5.45, -21.10217, 9.5),
    ]]
    chamfer(f18_edges, length=F18_SIZE)


solid = Compound([f1_1.part, f10_1.part, f8_9.part, f17.part])
